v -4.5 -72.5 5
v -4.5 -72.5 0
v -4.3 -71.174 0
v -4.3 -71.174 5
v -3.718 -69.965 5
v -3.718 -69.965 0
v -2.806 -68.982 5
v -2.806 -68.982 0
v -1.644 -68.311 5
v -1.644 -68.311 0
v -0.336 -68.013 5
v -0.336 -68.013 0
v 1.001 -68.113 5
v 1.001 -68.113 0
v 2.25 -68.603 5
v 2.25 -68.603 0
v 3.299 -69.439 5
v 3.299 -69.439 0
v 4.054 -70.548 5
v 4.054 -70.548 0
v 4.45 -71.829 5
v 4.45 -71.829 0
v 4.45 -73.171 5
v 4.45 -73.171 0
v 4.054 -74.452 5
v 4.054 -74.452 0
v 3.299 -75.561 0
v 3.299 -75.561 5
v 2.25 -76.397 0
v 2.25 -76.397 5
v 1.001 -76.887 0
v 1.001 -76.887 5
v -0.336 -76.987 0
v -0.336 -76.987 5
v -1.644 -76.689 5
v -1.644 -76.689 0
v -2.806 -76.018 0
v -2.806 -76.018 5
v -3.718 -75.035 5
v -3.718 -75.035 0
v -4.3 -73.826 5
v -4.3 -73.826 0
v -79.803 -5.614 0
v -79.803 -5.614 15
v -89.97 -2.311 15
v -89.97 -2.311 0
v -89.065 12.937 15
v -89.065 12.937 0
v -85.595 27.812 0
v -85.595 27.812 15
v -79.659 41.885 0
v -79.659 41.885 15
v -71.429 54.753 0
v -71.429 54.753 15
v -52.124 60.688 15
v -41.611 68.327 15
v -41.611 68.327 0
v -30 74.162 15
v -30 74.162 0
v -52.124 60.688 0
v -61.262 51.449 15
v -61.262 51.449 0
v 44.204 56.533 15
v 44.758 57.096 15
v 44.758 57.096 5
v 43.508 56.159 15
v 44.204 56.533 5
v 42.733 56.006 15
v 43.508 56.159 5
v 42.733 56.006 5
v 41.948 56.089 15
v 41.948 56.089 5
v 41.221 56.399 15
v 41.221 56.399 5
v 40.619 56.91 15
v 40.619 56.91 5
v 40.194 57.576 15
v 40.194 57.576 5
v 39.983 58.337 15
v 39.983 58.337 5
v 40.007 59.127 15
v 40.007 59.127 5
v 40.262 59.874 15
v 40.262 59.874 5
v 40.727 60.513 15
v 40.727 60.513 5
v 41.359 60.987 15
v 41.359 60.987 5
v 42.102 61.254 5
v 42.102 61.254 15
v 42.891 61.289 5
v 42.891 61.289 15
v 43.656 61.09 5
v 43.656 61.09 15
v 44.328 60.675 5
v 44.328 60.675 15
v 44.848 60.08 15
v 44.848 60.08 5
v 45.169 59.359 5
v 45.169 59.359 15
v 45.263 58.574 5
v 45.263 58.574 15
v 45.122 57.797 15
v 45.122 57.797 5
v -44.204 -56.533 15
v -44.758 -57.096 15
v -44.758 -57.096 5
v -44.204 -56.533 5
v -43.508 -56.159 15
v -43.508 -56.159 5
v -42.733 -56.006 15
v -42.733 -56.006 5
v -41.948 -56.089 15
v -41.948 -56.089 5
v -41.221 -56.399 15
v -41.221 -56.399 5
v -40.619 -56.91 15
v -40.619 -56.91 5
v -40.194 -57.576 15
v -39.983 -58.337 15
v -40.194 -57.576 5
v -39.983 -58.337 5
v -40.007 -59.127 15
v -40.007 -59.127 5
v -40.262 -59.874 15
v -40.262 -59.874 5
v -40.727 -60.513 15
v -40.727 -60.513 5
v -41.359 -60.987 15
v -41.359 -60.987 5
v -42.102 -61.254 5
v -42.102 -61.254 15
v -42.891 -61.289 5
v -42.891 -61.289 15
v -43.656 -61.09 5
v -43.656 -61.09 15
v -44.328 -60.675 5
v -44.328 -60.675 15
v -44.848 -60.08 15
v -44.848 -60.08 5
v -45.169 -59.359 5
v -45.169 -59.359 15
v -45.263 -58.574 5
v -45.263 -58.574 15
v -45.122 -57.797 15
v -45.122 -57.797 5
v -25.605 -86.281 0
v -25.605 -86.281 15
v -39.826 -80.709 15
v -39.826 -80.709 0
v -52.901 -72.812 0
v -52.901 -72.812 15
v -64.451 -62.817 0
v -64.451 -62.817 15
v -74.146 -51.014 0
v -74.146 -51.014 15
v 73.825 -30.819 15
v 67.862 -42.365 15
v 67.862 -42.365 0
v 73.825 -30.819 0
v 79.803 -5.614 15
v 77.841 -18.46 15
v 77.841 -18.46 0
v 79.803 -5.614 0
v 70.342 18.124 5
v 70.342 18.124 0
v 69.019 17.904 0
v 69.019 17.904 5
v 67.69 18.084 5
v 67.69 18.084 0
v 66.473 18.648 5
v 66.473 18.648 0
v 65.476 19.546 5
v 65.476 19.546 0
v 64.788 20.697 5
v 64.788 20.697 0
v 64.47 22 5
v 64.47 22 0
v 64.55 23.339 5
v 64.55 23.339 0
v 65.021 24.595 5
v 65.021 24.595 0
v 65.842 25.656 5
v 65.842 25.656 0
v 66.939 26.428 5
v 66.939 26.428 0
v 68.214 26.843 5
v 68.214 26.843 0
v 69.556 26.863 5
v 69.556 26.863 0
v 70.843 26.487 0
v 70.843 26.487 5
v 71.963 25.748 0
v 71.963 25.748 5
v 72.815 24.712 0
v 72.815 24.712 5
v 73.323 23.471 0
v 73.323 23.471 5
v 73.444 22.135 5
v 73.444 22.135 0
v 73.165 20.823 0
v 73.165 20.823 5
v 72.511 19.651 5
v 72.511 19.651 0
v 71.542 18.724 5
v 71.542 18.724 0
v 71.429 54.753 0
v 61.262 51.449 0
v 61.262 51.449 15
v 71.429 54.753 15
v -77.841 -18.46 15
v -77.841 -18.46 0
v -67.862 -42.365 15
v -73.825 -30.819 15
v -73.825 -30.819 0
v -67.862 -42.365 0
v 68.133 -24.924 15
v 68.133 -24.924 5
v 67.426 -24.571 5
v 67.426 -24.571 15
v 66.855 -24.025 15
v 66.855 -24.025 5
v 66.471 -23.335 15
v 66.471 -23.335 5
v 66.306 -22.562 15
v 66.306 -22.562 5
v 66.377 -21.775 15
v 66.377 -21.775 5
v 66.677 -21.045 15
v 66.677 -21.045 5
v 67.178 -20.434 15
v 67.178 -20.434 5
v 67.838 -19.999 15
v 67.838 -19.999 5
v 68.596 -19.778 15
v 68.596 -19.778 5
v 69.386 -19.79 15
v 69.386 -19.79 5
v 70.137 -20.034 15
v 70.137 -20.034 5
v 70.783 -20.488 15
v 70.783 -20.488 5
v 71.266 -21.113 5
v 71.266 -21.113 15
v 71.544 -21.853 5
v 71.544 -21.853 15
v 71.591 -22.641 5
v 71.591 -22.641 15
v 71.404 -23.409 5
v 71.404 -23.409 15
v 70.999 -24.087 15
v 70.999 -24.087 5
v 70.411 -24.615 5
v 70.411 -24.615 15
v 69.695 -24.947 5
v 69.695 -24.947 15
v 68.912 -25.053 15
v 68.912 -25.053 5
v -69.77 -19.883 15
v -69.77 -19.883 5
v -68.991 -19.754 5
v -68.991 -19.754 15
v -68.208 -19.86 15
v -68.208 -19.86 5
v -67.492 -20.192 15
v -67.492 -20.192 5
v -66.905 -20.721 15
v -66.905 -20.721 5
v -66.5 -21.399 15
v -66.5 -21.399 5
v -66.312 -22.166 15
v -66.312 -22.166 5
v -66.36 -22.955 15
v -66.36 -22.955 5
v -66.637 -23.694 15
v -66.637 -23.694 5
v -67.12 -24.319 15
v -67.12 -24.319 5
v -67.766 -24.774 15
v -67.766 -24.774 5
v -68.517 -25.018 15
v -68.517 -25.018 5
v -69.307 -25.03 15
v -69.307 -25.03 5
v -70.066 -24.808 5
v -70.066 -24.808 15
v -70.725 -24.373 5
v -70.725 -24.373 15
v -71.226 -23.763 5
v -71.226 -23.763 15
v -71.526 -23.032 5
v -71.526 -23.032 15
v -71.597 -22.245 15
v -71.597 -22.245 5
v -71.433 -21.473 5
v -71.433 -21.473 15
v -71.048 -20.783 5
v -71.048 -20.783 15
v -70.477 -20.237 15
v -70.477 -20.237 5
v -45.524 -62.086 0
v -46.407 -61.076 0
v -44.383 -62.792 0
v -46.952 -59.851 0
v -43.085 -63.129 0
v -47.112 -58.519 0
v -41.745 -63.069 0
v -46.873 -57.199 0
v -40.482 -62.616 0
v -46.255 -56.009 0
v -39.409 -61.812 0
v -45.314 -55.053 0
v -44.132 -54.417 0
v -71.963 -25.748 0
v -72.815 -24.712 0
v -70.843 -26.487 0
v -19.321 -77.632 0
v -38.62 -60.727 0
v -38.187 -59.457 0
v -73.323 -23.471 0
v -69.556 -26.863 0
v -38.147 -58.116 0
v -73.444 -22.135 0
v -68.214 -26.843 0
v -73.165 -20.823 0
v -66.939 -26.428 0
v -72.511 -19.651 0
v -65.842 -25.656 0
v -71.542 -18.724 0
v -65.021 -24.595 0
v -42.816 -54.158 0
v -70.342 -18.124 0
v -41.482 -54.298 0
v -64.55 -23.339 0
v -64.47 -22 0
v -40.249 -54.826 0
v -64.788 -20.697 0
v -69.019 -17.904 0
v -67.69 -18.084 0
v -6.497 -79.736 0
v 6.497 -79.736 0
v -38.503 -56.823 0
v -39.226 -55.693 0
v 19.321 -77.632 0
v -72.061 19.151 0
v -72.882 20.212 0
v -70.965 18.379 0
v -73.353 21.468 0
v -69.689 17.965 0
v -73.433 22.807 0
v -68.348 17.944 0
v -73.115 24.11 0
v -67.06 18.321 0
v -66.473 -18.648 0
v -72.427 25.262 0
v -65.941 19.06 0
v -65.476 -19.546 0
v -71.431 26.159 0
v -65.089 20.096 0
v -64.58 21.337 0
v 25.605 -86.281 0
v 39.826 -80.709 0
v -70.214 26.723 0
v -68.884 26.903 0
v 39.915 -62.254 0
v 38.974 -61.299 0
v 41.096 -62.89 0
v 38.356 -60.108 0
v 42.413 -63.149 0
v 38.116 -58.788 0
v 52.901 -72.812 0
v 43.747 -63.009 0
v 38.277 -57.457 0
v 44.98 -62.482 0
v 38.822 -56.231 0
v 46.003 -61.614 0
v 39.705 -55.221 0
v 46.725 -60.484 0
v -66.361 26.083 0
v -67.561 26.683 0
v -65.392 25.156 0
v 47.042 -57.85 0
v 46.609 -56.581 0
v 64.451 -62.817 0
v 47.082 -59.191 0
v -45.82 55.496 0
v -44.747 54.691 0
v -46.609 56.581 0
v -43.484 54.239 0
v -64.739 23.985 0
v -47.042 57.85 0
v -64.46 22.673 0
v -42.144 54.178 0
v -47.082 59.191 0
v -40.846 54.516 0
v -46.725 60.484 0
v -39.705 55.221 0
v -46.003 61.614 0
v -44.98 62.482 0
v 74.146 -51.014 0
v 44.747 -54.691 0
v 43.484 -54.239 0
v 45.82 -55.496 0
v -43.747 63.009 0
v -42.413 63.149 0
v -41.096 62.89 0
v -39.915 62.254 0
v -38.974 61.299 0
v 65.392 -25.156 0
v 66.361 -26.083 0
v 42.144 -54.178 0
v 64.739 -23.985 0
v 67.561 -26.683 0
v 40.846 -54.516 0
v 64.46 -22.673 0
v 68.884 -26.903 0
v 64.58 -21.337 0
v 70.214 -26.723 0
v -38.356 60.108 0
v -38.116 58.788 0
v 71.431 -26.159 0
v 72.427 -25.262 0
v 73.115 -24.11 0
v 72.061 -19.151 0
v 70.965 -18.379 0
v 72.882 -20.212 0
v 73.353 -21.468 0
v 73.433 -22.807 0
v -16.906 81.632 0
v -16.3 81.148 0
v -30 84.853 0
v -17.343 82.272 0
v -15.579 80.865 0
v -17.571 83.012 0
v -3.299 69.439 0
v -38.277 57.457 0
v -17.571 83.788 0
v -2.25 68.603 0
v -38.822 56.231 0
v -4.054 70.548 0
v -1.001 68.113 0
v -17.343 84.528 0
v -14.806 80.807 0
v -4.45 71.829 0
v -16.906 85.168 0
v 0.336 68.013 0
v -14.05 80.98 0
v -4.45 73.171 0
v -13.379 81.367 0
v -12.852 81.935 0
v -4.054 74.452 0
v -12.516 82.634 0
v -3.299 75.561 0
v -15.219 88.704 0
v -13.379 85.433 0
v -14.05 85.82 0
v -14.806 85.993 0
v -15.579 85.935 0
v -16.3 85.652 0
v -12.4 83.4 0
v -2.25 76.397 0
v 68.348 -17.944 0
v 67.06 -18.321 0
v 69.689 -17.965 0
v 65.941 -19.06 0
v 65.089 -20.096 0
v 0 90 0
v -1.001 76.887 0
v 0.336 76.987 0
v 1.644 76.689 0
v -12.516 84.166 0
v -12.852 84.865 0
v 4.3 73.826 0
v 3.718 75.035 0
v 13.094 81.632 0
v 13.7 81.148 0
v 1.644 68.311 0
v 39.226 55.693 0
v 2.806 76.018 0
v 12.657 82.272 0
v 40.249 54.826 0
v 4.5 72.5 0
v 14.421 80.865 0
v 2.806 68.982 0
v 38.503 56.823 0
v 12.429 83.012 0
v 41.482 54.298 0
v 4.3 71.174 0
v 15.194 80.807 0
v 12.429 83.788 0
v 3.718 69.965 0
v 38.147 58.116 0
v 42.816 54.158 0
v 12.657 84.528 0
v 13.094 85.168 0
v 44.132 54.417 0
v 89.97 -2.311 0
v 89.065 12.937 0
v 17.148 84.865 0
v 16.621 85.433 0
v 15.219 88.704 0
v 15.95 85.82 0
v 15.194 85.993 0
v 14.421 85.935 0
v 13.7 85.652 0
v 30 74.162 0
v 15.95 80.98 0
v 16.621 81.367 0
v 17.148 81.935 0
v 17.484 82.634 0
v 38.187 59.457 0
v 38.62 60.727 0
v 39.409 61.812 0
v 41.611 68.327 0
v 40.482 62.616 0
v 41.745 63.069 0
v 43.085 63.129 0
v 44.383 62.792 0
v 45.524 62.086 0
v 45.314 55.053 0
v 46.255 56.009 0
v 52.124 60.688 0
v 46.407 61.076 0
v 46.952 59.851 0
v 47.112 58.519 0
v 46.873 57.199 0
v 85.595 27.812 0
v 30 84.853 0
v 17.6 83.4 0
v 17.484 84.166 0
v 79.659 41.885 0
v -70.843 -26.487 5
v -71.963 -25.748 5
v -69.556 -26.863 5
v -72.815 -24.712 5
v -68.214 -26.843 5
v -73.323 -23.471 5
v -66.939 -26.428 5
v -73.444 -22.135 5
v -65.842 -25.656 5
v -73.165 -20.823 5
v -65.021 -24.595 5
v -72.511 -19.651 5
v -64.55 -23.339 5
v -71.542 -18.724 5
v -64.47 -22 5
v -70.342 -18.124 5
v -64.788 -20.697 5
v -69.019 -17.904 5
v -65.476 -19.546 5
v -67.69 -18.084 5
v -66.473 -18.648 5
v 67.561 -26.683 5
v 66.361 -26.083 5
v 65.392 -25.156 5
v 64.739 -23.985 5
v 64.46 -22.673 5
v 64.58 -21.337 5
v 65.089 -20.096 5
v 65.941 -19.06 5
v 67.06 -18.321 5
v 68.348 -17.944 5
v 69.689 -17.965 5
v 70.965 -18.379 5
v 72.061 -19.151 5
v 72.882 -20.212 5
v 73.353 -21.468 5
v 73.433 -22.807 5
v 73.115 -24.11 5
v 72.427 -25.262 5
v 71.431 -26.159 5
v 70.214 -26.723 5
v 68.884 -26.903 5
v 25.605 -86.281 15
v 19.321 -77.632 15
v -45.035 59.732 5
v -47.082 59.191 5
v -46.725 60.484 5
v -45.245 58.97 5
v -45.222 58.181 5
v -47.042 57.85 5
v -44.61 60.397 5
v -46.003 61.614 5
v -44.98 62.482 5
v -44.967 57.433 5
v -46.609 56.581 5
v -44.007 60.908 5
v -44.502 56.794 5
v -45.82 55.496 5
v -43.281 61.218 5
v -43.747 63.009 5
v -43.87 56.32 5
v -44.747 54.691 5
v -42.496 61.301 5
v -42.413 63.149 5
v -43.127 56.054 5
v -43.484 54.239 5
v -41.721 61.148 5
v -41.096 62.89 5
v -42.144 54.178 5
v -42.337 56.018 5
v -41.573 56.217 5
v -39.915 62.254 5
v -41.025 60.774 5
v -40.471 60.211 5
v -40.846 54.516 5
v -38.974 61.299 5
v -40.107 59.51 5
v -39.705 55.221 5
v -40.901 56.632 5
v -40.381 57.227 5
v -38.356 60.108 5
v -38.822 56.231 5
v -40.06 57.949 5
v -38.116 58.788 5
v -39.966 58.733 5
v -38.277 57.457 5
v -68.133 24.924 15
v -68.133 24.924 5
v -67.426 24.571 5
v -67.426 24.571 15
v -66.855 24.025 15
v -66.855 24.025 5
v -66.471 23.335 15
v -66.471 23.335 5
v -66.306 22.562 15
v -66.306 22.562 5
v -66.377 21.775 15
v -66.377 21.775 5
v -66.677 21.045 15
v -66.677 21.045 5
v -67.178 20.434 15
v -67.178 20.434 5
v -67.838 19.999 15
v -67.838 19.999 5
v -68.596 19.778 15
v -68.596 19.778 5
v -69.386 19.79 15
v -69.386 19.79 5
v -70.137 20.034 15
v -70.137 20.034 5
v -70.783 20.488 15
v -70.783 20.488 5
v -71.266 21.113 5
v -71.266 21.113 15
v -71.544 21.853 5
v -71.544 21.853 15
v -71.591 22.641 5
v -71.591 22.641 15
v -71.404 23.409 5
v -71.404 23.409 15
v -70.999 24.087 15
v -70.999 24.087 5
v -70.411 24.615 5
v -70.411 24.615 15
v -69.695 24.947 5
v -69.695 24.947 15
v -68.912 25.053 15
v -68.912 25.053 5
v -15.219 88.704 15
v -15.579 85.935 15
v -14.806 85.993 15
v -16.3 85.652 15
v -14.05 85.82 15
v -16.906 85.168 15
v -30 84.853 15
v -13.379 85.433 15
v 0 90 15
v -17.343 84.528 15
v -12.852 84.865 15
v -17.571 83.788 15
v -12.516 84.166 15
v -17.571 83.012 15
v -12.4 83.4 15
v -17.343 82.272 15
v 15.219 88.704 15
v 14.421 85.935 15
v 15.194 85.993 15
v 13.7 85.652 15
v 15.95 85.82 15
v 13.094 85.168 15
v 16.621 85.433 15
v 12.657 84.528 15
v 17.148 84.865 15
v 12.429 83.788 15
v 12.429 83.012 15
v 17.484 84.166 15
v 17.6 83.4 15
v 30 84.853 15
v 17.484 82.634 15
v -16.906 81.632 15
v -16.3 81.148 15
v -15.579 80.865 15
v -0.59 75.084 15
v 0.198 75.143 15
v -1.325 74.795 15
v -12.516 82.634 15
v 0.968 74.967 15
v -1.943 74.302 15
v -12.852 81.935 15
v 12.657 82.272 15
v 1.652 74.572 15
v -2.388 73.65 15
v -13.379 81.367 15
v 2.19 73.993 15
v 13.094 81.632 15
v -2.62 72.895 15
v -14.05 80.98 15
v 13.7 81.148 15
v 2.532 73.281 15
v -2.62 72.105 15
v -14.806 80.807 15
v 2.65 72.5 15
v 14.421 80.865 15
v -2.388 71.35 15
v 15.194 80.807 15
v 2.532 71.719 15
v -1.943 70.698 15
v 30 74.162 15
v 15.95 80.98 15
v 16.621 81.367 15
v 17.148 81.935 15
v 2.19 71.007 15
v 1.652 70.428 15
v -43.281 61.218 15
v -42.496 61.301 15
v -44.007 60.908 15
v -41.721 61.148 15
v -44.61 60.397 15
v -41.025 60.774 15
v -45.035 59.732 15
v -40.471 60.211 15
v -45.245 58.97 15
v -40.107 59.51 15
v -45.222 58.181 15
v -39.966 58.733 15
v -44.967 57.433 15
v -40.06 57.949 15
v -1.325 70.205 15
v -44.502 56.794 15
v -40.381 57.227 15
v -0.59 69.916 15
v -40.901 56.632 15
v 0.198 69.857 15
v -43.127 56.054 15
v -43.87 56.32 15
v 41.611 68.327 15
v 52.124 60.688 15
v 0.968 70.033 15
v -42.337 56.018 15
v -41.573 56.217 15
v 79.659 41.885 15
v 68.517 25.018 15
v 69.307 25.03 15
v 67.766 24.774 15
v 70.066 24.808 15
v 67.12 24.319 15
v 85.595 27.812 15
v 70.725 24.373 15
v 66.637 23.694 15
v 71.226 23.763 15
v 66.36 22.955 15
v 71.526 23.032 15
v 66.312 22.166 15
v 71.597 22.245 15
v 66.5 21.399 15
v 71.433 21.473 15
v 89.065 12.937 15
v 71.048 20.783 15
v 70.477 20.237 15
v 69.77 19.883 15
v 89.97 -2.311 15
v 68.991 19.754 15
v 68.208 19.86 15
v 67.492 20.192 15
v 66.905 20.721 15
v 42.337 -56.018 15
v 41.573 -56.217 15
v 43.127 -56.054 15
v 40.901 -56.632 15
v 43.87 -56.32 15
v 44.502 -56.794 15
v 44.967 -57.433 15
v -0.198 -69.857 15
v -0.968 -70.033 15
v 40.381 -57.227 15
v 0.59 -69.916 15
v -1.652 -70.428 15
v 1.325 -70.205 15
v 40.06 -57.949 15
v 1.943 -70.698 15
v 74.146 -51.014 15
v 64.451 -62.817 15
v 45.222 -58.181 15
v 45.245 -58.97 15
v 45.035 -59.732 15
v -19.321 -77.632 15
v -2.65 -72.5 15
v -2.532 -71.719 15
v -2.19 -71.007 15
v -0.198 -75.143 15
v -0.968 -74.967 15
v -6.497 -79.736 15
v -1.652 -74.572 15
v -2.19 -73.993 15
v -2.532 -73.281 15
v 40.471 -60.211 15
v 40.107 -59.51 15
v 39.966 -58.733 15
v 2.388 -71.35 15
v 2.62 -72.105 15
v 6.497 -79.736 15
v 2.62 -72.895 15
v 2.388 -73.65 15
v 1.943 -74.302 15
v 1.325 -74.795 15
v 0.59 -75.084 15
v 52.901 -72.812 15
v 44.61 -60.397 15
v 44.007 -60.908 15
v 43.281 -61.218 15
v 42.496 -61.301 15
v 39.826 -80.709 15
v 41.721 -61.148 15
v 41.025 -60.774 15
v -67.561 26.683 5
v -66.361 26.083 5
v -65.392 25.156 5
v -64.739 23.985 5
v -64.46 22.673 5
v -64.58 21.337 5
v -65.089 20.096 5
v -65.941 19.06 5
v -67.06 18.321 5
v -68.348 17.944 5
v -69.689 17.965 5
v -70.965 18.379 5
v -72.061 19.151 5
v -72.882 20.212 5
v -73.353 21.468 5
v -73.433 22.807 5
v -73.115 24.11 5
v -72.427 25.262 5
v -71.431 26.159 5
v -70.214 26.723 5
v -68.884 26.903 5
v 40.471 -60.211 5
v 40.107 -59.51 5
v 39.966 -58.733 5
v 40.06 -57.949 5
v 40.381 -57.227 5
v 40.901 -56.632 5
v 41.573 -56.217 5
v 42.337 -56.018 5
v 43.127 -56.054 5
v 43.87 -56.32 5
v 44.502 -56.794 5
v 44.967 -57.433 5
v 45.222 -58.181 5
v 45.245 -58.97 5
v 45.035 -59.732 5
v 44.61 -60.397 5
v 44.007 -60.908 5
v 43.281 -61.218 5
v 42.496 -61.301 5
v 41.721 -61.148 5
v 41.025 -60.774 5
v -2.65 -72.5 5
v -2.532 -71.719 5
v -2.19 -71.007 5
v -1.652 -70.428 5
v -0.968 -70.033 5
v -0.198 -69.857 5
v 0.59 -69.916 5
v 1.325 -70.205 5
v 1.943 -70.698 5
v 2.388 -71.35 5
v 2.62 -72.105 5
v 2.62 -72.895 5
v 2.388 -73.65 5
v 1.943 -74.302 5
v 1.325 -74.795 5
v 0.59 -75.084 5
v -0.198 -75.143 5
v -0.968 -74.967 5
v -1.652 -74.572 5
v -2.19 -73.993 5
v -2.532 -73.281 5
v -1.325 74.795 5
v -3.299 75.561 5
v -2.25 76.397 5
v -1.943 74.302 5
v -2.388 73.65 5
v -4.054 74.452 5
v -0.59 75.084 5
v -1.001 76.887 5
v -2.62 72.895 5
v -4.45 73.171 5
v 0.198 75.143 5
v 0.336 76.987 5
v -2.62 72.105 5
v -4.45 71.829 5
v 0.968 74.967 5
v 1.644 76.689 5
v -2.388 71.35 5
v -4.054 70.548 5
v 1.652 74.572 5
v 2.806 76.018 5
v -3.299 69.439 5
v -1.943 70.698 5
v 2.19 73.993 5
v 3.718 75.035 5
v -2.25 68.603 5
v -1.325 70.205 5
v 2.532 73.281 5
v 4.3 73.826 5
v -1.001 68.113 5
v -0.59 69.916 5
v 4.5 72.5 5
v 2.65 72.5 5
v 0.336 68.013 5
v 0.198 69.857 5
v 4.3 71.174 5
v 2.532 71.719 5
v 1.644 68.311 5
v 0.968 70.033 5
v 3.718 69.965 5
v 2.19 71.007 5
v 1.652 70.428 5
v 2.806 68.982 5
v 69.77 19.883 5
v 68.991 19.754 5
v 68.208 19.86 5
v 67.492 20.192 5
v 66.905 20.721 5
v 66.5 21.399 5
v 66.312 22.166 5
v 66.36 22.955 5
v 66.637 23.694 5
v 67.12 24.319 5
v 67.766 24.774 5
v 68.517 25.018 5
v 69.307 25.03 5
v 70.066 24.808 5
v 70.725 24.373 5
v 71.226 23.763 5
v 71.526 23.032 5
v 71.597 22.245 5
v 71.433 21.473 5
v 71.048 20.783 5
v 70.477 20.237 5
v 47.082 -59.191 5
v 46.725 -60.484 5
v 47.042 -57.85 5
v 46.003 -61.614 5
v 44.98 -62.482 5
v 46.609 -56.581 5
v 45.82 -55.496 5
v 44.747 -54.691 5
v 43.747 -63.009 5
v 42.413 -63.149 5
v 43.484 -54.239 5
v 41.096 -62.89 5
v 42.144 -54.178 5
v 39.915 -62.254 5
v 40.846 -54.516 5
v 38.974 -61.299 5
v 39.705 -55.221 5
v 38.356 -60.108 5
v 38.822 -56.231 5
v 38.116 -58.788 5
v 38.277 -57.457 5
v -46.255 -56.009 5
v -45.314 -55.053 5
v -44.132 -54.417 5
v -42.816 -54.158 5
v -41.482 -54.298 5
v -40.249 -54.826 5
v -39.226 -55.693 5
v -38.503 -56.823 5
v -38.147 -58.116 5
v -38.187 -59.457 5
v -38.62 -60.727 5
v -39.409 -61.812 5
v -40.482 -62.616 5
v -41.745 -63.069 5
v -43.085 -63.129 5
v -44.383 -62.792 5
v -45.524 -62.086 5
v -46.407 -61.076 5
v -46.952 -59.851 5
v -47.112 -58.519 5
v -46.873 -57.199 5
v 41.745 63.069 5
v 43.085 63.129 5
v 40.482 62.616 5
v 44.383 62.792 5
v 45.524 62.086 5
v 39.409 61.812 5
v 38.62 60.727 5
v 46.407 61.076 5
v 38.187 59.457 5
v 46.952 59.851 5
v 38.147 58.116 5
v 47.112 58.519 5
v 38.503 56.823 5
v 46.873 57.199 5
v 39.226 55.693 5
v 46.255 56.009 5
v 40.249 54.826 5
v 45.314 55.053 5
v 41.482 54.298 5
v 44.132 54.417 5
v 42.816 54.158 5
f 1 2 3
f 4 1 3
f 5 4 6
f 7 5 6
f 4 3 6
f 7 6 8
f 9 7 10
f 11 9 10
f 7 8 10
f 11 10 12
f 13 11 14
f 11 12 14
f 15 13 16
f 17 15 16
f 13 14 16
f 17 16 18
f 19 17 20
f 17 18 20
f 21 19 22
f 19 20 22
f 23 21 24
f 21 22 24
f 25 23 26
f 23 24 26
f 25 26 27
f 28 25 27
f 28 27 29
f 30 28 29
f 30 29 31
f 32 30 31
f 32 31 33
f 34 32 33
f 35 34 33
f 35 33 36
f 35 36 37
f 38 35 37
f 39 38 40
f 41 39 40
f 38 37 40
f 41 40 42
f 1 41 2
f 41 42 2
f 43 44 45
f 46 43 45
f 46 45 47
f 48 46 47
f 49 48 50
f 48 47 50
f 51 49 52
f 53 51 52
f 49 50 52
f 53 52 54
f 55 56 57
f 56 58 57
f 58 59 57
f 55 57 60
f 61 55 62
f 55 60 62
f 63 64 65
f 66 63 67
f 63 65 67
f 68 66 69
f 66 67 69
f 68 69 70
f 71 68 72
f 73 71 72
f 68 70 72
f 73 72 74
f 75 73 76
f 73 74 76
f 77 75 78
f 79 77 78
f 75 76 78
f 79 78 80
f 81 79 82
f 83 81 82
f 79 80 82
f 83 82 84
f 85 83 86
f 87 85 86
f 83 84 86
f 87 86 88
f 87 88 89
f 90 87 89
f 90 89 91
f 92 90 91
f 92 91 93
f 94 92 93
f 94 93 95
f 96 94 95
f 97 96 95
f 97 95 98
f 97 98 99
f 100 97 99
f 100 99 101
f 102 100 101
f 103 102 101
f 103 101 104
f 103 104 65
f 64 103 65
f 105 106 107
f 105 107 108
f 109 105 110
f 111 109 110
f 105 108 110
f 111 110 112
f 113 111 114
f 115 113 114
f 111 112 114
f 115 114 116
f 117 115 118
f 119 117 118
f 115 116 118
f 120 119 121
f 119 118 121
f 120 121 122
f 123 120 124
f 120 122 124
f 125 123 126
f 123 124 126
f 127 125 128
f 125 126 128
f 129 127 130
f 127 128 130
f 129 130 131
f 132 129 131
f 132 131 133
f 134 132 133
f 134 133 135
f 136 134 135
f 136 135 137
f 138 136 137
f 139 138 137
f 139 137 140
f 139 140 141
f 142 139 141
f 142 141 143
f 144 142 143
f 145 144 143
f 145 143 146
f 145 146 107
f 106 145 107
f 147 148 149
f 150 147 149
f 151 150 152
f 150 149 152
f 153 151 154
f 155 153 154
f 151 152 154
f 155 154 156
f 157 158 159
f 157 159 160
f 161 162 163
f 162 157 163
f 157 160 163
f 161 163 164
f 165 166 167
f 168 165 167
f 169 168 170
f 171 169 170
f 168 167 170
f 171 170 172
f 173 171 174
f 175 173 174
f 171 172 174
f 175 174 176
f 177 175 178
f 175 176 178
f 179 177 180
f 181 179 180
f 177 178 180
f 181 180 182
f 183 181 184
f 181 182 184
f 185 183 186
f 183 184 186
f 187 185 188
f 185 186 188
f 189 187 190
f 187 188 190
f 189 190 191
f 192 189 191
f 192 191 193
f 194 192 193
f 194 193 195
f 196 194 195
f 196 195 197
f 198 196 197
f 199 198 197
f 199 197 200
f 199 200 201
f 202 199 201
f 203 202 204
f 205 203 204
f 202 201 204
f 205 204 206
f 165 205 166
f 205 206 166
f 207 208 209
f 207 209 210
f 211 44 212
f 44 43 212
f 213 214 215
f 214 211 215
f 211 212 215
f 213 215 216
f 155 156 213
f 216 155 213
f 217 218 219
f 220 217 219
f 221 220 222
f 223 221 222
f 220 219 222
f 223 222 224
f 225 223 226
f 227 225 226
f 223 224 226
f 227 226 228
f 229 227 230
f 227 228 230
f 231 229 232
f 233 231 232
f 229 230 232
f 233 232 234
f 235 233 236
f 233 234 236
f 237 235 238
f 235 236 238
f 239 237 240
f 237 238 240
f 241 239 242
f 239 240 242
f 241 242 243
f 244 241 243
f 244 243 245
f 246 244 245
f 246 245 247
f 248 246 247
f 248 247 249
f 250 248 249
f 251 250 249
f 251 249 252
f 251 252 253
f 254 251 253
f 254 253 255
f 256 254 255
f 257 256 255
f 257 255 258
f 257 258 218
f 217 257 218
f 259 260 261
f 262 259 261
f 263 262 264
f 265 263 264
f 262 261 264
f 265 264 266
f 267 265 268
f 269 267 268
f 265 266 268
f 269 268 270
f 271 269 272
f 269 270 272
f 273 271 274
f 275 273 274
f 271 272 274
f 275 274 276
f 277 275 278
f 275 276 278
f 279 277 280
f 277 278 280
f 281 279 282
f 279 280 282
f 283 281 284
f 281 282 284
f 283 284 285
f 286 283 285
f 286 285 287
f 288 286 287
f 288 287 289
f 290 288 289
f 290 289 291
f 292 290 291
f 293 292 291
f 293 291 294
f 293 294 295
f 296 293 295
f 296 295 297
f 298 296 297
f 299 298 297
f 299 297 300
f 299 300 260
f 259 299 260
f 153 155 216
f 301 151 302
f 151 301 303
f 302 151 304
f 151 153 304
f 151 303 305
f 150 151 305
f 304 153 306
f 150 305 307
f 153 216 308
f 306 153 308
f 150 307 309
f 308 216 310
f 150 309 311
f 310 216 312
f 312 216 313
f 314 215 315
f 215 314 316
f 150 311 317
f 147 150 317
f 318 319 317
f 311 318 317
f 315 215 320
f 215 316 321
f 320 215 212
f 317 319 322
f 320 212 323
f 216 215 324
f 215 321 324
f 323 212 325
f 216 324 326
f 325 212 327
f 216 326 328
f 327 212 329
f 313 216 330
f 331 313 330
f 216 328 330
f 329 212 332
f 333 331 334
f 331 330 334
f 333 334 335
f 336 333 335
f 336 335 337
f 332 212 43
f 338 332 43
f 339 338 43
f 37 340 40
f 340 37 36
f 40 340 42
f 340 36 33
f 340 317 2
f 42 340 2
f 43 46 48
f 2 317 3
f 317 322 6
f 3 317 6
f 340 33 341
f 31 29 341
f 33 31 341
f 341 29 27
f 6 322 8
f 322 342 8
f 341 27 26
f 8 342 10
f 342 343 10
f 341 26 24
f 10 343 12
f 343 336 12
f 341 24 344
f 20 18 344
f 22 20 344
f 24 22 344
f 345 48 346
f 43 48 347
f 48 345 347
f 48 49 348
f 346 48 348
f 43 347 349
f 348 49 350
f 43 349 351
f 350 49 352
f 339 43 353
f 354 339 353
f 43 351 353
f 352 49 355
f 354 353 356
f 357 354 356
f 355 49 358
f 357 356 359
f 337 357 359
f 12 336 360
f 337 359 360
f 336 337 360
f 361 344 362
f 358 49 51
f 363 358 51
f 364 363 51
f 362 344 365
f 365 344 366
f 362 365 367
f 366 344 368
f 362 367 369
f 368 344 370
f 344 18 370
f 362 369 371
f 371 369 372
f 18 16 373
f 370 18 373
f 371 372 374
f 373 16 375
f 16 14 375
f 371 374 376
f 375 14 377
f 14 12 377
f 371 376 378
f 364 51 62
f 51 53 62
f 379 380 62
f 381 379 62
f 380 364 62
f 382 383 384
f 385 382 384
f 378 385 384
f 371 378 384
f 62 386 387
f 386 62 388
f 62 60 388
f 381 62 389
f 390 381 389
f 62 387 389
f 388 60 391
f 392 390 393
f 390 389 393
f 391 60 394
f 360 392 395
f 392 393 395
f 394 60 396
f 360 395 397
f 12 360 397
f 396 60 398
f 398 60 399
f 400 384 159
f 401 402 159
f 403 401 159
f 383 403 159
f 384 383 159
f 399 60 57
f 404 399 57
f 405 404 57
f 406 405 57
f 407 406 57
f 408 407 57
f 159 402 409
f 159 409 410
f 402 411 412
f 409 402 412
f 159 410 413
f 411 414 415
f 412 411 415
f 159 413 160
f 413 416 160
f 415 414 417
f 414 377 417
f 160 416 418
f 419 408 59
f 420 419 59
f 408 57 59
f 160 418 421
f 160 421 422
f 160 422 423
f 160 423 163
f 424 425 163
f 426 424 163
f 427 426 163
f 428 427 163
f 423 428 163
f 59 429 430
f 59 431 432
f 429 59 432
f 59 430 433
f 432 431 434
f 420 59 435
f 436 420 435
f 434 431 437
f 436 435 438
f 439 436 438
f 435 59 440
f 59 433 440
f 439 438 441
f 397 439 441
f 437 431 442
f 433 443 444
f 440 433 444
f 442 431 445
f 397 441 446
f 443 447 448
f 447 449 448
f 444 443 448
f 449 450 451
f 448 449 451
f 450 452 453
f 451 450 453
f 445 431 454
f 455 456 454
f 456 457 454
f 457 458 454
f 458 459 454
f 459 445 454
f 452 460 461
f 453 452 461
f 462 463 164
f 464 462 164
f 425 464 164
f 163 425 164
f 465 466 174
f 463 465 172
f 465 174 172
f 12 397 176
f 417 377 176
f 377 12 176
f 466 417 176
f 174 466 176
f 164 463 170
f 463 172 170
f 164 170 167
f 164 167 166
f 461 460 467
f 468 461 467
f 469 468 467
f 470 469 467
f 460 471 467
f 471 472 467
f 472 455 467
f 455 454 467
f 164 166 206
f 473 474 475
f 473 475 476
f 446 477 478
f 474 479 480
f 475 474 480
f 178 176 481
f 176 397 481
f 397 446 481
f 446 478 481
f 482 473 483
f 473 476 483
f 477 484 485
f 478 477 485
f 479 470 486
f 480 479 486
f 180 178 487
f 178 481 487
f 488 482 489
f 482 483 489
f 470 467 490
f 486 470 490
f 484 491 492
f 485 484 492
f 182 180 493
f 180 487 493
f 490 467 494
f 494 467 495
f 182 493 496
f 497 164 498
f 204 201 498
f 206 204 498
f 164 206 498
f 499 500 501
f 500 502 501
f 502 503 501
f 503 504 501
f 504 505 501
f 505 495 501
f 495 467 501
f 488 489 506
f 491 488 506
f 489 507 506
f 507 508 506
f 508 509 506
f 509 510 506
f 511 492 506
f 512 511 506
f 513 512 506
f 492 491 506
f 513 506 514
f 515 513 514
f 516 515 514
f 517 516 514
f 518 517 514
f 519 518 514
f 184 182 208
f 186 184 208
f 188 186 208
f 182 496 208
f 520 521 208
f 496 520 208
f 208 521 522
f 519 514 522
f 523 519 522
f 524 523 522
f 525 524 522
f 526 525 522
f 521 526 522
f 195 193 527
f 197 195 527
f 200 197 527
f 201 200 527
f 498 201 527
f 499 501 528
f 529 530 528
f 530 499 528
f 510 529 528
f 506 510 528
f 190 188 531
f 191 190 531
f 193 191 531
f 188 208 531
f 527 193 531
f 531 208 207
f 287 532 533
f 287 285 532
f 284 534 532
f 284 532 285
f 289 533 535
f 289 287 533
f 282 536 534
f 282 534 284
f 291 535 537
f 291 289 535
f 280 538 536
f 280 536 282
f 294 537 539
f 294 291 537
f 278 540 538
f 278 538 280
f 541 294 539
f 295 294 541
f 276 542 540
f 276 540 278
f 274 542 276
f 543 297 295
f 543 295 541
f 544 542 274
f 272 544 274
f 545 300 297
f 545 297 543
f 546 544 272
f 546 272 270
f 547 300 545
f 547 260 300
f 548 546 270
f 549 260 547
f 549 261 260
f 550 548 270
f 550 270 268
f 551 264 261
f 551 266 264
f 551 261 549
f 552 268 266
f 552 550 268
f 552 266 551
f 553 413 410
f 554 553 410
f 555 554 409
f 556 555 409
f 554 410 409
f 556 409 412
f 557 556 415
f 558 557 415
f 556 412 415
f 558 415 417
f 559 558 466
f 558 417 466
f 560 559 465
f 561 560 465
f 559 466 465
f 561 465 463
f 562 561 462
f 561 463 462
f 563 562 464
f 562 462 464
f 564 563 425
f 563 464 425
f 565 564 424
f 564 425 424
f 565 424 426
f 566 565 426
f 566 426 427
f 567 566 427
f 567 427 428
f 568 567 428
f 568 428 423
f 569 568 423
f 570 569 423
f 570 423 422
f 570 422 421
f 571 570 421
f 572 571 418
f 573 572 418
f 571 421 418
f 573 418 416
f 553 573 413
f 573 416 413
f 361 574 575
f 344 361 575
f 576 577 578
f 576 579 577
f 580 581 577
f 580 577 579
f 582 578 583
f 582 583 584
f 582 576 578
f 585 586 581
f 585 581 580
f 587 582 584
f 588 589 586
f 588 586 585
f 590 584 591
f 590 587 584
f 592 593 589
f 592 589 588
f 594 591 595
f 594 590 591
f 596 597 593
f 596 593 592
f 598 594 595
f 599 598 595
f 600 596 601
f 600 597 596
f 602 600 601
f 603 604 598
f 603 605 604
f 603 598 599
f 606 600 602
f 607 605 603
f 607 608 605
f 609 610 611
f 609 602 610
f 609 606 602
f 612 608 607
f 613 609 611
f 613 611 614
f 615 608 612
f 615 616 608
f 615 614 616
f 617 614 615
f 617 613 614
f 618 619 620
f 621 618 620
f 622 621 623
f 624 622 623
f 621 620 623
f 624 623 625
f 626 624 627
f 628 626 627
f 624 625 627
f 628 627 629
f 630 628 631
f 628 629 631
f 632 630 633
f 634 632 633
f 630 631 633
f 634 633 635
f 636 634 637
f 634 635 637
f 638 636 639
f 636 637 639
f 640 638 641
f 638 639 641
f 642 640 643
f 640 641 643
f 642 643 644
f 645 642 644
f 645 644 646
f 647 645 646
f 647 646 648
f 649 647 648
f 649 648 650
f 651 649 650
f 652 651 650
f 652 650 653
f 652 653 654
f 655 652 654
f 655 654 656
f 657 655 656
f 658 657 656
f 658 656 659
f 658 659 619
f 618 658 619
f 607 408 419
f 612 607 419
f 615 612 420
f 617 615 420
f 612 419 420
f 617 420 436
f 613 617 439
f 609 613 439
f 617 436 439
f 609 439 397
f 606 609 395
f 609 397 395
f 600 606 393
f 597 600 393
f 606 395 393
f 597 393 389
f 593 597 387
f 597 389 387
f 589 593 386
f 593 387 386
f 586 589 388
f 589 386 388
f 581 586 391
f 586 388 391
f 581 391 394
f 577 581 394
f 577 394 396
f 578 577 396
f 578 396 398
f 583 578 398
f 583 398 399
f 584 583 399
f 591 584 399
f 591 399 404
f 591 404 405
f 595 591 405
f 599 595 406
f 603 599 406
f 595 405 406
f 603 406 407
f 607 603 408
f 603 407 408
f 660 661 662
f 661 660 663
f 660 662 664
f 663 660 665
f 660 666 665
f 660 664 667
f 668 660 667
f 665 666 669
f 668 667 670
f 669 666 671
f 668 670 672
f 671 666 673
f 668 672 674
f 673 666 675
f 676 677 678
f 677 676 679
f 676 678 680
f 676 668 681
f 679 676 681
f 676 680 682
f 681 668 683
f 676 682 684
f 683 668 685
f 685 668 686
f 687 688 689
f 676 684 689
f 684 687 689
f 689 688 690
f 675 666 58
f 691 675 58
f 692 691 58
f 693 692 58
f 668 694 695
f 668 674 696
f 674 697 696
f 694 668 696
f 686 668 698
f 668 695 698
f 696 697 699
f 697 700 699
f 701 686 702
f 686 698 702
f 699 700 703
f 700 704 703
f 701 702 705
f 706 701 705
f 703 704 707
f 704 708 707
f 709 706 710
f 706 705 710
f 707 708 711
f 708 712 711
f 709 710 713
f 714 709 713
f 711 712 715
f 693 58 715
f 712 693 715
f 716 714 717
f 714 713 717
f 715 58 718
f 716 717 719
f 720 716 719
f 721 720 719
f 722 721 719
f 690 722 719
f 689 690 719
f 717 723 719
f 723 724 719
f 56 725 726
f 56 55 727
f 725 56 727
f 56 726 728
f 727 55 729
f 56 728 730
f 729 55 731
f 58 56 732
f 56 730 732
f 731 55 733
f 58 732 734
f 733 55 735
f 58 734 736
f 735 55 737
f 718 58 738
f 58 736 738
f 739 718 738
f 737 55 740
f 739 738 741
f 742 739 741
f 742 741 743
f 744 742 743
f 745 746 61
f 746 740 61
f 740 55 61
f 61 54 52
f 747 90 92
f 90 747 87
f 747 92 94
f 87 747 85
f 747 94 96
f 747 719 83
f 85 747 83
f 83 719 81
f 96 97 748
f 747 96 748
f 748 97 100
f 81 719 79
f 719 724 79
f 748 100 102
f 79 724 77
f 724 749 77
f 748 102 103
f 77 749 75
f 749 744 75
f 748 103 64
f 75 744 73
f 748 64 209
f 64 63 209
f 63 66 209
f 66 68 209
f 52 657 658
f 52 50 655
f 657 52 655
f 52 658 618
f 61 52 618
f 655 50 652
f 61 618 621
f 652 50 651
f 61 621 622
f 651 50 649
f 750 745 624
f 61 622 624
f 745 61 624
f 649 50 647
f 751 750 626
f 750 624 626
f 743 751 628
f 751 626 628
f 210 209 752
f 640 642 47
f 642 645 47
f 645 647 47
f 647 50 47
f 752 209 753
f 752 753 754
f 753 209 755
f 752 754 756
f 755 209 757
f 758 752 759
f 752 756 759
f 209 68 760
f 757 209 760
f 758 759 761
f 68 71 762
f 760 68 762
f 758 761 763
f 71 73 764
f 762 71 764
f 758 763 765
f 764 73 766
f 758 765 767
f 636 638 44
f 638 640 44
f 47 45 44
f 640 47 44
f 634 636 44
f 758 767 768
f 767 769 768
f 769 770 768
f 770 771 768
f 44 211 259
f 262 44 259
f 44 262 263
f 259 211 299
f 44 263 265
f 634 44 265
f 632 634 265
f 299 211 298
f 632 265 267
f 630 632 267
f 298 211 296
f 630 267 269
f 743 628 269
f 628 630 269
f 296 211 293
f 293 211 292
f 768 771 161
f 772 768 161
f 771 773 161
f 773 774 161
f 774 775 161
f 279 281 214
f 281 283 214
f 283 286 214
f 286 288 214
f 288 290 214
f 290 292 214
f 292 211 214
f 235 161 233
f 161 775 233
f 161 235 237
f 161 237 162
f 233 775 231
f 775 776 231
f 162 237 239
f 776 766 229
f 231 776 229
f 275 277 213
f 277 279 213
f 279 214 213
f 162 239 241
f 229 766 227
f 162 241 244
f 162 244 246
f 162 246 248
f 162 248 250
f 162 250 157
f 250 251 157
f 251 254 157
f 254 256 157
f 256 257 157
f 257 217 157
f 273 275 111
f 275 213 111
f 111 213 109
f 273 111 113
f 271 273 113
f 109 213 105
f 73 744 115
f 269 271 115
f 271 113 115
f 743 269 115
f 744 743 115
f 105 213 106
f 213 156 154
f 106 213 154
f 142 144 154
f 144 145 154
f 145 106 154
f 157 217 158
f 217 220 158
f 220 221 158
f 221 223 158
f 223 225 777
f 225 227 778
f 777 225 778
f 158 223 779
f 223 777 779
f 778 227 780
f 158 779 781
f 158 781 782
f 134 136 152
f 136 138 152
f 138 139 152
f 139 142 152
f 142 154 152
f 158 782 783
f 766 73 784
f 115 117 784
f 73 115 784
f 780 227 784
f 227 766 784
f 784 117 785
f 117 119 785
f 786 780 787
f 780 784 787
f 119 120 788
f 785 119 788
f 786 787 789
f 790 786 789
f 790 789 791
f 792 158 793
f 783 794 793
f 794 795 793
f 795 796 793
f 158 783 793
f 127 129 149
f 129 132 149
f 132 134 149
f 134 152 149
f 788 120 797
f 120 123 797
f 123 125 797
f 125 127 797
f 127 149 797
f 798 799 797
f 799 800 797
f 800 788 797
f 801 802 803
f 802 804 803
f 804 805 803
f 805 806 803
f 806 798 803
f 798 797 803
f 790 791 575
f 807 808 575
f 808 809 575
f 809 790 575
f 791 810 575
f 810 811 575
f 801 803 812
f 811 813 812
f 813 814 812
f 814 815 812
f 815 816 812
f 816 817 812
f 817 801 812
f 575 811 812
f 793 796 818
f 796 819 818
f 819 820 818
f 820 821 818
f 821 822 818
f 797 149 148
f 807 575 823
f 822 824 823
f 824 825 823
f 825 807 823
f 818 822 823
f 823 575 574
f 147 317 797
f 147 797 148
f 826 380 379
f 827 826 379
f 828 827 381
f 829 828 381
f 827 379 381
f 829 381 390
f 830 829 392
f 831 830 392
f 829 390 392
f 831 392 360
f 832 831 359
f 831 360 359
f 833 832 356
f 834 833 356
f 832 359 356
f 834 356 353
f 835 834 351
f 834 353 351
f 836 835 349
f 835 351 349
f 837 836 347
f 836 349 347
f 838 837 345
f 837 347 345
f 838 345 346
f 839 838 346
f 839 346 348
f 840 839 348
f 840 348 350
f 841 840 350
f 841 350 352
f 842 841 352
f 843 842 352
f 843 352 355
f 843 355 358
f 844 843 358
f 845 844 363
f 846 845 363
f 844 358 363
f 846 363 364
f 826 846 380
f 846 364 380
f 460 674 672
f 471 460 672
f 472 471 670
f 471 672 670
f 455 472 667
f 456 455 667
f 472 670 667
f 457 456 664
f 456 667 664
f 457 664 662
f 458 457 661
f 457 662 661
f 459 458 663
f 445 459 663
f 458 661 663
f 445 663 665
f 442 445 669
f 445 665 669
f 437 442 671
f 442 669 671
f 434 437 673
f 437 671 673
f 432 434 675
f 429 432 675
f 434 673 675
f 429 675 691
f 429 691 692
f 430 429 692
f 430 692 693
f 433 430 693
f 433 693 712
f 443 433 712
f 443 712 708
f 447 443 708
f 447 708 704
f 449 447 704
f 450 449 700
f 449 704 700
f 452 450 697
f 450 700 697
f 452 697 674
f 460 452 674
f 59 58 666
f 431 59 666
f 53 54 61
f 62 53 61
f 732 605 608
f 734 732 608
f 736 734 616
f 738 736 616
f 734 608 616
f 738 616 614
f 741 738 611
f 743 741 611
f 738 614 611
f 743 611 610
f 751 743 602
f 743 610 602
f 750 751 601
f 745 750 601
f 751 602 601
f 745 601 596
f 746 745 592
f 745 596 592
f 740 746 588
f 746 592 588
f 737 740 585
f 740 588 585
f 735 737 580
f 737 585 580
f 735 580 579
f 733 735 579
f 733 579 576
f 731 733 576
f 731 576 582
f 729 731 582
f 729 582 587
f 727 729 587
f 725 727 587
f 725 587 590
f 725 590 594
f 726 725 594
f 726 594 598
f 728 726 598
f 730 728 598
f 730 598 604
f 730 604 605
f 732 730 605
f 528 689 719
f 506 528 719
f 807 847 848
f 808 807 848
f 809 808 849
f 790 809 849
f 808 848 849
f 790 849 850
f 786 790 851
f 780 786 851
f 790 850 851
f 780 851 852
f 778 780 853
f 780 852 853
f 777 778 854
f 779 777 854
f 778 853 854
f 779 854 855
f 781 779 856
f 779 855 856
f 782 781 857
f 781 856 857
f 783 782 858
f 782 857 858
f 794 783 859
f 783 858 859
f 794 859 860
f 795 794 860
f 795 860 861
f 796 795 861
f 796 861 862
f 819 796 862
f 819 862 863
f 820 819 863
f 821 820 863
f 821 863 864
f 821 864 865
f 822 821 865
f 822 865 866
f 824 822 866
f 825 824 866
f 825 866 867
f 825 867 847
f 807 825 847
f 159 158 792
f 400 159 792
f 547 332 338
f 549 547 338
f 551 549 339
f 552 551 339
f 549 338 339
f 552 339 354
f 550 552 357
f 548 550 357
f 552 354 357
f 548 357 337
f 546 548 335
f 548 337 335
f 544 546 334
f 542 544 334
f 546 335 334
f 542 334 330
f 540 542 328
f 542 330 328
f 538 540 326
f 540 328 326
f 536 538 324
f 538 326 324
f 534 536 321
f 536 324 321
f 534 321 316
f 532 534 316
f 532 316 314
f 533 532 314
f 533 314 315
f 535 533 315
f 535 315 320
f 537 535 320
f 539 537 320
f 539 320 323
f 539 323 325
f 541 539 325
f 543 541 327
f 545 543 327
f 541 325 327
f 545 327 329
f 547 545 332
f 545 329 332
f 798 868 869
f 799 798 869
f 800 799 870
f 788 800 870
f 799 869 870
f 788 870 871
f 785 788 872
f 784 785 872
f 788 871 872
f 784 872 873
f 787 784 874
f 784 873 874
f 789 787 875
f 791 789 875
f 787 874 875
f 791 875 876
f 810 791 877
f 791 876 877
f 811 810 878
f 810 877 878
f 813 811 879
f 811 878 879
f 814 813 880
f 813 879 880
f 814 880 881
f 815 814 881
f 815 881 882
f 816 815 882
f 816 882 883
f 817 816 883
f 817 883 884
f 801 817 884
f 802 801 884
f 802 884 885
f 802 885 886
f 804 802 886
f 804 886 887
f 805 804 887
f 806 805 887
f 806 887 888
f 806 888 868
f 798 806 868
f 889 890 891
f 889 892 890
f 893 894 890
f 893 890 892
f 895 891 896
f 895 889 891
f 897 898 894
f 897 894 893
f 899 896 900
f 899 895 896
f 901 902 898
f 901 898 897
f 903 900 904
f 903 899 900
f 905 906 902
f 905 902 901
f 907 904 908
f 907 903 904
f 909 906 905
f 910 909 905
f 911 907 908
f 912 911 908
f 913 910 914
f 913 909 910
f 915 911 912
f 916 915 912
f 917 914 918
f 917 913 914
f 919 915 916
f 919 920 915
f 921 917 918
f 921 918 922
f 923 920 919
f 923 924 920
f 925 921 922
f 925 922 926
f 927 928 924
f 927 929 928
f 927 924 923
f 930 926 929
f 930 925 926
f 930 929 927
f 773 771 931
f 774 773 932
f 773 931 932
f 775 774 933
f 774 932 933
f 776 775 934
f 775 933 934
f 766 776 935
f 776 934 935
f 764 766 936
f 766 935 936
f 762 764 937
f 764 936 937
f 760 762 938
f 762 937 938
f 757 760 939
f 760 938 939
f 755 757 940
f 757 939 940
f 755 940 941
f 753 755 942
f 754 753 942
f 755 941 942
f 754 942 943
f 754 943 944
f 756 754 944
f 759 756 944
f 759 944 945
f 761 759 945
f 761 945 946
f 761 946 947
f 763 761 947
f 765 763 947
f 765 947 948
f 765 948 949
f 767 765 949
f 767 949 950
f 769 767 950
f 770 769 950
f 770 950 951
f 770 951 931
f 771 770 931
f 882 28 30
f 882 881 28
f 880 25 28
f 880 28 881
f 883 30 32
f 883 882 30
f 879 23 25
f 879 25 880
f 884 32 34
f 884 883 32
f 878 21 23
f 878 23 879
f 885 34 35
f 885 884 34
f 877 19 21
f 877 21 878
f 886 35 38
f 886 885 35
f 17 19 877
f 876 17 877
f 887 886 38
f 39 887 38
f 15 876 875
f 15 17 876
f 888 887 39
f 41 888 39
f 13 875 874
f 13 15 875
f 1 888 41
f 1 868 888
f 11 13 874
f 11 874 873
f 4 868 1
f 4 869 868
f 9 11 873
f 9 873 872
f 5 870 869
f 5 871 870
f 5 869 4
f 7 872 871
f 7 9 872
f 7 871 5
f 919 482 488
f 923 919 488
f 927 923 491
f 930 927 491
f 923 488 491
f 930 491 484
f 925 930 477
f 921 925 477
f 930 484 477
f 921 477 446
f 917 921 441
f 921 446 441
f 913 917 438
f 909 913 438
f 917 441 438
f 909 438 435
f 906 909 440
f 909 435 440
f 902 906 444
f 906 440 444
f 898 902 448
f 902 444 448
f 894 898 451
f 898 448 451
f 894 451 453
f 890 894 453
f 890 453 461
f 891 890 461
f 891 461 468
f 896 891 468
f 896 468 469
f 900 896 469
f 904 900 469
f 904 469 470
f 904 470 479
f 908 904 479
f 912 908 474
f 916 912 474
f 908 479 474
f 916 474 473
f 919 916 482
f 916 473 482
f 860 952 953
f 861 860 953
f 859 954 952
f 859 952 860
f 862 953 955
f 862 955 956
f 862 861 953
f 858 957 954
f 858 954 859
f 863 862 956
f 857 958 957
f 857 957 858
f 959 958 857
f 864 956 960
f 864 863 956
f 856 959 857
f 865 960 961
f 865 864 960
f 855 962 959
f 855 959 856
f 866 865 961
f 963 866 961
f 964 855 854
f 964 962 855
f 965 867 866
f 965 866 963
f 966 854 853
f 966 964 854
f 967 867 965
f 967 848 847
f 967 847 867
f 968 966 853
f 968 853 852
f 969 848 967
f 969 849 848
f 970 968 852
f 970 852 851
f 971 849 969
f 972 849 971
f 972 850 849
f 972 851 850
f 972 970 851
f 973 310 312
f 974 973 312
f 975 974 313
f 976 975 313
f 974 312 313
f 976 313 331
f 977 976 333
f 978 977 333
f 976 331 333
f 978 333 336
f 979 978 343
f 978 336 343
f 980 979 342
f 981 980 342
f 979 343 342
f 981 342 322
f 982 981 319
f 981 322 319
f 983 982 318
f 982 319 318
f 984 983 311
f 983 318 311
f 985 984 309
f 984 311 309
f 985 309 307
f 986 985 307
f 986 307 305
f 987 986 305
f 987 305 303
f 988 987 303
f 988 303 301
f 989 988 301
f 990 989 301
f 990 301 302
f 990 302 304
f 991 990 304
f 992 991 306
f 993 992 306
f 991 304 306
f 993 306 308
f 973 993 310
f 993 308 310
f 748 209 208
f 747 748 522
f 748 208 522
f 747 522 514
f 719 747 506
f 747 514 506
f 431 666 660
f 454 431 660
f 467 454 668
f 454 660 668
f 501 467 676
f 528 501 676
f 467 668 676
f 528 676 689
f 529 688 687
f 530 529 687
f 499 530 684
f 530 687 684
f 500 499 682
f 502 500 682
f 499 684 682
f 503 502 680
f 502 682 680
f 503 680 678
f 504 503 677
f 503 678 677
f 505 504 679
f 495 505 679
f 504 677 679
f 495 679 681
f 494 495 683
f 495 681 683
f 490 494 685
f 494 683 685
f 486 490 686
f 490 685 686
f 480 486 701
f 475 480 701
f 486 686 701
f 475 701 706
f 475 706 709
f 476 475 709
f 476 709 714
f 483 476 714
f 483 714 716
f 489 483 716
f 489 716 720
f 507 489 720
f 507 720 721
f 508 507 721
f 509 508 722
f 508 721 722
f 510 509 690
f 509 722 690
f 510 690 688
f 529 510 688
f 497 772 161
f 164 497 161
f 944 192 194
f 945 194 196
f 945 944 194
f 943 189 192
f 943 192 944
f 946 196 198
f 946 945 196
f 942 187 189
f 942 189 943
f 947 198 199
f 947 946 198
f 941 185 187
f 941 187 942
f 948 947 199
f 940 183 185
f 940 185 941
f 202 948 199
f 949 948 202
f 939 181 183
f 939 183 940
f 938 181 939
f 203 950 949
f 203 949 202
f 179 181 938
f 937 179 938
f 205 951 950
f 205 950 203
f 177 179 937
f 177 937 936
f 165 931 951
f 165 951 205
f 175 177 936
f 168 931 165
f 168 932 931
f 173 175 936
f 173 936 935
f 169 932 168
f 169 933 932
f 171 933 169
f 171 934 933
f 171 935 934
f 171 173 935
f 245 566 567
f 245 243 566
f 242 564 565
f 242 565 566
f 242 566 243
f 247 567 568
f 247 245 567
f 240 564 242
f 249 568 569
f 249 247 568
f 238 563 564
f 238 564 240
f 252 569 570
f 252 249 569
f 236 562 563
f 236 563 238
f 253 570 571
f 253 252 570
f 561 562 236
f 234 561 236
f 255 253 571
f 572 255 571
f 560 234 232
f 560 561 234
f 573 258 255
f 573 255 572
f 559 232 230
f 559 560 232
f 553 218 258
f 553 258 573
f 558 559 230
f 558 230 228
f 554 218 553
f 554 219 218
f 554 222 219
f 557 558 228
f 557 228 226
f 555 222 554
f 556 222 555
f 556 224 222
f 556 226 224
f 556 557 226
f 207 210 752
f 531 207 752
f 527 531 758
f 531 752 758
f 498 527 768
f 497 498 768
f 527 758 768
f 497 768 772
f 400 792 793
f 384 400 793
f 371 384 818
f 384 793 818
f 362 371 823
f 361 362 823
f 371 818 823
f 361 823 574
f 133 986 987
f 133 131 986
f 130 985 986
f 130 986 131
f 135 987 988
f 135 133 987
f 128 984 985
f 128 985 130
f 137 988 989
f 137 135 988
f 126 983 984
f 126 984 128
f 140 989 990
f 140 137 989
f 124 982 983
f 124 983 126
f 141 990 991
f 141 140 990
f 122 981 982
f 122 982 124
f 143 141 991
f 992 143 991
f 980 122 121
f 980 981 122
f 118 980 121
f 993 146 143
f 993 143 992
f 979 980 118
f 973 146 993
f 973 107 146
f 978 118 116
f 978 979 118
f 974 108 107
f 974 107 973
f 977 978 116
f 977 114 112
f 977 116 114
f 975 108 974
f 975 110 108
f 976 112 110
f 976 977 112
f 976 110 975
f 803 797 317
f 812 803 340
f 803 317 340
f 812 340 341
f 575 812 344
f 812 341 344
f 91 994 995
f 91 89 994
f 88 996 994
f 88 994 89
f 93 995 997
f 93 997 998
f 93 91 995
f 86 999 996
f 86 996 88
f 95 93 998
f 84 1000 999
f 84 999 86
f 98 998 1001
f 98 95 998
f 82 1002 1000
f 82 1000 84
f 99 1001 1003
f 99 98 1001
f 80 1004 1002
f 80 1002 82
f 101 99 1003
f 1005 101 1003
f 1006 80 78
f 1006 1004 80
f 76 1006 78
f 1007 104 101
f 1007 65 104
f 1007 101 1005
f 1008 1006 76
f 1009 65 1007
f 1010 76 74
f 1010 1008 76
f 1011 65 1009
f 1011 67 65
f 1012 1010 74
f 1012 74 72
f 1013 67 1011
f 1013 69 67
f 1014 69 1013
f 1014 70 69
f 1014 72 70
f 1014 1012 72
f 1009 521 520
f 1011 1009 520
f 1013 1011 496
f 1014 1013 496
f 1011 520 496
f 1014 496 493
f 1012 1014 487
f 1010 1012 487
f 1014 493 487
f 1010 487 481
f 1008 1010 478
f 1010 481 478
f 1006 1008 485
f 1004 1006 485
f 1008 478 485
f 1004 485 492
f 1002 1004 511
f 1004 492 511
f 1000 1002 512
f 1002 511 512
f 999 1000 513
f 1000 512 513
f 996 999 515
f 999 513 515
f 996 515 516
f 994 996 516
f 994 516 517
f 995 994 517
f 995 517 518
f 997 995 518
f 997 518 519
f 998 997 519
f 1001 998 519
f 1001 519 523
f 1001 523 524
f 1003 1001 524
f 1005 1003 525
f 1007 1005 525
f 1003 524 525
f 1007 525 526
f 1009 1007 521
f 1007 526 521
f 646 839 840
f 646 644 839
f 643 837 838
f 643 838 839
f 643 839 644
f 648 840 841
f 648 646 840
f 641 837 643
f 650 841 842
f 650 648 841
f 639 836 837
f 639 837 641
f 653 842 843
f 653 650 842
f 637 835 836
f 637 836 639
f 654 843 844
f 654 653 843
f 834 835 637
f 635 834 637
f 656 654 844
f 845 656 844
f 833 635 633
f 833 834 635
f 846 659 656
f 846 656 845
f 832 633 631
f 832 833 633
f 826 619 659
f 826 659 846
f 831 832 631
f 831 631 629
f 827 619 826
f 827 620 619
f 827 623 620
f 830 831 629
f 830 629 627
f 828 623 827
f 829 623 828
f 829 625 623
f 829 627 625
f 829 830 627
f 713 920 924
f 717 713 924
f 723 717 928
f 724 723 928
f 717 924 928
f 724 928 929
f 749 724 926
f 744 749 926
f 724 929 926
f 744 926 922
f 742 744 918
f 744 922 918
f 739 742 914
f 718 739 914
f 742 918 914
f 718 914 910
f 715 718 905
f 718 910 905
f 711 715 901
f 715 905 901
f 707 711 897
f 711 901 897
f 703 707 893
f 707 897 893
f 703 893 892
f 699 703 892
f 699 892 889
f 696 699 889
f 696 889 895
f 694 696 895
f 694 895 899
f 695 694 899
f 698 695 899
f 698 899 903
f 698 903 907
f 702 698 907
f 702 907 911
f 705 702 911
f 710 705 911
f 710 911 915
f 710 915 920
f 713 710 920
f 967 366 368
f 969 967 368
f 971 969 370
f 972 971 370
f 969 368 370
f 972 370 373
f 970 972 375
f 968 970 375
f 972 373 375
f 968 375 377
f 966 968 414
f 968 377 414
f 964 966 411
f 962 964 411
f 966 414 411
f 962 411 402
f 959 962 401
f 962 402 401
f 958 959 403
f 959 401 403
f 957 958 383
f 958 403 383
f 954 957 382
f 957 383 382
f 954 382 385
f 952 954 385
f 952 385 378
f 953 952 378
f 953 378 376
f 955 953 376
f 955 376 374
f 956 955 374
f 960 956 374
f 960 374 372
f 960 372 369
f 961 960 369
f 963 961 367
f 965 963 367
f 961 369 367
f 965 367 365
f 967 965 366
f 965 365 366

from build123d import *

# Parameters (mm, degrees)
SKIZZE1_R                       = 80
AUFSATZ_LINEAR_AUSTRAGEN1_DEPTH = 15
SKIZZE8_R                       = 2.65
SCHNITT_LINEAR_AUSTRAGEN1_DEPTH = 15
KREISMUSTER1_COUNT              = 10
SKIZZE9_R                       = 4.5
SCHNITT_LINEAR_AUSTRAGEN2_DEPTH = 5
KREISMUSTER2_COUNT              = 10
AUFSATZ_LINEAR_AUSTRAGEN2_DEPTH = 15
KREISMUSTER3_COUNT              = 5
SKIZZE11_R                      = 2.6
SCHNITT_LINEAR_AUSTRAGEN3_DEPTH = 15


with BuildPart() as part:
    # Skizze1 → Aufsatz-Linear austragen1 (new body)
    with BuildSketch(Plane.XY):
        Circle(SKIZZE1_R)
    extrude(amount=AUFSATZ_LINEAR_AUSTRAGEN1_DEPTH)

    # Skizze8 → Schnitt-Linear austragen1 (cut)
    with BuildSketch(Plane(origin=(0, 0, 0), x_dir=(-1, 0, 0), z_dir=(0, 0, -1))):
        with Locations((0, -72.5)):
            Circle(SKIZZE8_R)
    schnitt_linear_austragen1 = extrude(amount=-SCHNITT_LINEAR_AUSTRAGEN1_DEPTH, mode=Mode.SUBTRACT)

    # Kreismuster1: Schnitt-Linear austragen1 ×10 about axis
    kreismuster1_axis = Axis((0, 0, 0), (0, 0, 1))
    for i in range(1, KREISMUSTER1_COUNT):
        add(schnitt_linear_austragen1.rotate(kreismuster1_axis, i * 360 / KREISMUSTER1_COUNT), mode=Mode.SUBTRACT)

    # Skizze9 → Schnitt-Linear austragen2 (cut)
    with BuildSketch(Plane(origin=(0, 0, 0), x_dir=(-1, 0, 0), z_dir=(0, 0, -1))):
        with Locations((0, -72.5)):
            Circle(SKIZZE9_R)
    schnitt_linear_austragen2 = extrude(amount=-SCHNITT_LINEAR_AUSTRAGEN2_DEPTH, mode=Mode.SUBTRACT)

    # Kreismuster2: Schnitt-Linear austragen2 ×10 about axis
    kreismuster2_axis = Axis((0, 0, 0), (0, 0, 1))
    for i in range(1, KREISMUSTER2_COUNT):
        add(schnitt_linear_austragen2.rotate(kreismuster2_axis, i * 360 / KREISMUSTER2_COUNT), mode=Mode.SUBTRACT)

    # Skizze10 → Aufsatz-Linear austragen2 (add)
    with BuildSketch(Plane.XY.offset(15)):
        with BuildLine():
            Line((-30, 69.852813742), (-30, 84.852813742))
            ThreePointArc((-30, 84.852813742), (0, 90), (30, 84.852813742))
            Line((30, 84.852813742), (30, 69.852813742))
            Line((30, 69.852813742), (0, 80))
            Line((0, 80), (-30, 69.852813742))
        make_face()
    aufsatz_linear_austragen2 = extrude(amount=-AUFSATZ_LINEAR_AUSTRAGEN2_DEPTH)

    # Kreismuster3: Aufsatz-Linear austragen2 ×5 about axis
    kreismuster3_axis = Axis((0, 0, 0), (0, 0, 1))
    for i in range(1, KREISMUSTER3_COUNT):
        add(aufsatz_linear_austragen2.rotate(kreismuster3_axis, i * 360 / KREISMUSTER3_COUNT))

    # Skizze11 → Schnitt-Linear austragen3 (cut)
    with BuildSketch(Plane.XY.offset(15)):
        with Locations((-15, 83.4)):
            Circle(SKIZZE11_R)
        with Locations((15, 83.4)):
            Circle(SKIZZE11_R)
    extrude(amount=-SCHNITT_LINEAR_AUSTRAGEN3_DEPTH, mode=Mode.SUBTRACT)


solid = part.part
